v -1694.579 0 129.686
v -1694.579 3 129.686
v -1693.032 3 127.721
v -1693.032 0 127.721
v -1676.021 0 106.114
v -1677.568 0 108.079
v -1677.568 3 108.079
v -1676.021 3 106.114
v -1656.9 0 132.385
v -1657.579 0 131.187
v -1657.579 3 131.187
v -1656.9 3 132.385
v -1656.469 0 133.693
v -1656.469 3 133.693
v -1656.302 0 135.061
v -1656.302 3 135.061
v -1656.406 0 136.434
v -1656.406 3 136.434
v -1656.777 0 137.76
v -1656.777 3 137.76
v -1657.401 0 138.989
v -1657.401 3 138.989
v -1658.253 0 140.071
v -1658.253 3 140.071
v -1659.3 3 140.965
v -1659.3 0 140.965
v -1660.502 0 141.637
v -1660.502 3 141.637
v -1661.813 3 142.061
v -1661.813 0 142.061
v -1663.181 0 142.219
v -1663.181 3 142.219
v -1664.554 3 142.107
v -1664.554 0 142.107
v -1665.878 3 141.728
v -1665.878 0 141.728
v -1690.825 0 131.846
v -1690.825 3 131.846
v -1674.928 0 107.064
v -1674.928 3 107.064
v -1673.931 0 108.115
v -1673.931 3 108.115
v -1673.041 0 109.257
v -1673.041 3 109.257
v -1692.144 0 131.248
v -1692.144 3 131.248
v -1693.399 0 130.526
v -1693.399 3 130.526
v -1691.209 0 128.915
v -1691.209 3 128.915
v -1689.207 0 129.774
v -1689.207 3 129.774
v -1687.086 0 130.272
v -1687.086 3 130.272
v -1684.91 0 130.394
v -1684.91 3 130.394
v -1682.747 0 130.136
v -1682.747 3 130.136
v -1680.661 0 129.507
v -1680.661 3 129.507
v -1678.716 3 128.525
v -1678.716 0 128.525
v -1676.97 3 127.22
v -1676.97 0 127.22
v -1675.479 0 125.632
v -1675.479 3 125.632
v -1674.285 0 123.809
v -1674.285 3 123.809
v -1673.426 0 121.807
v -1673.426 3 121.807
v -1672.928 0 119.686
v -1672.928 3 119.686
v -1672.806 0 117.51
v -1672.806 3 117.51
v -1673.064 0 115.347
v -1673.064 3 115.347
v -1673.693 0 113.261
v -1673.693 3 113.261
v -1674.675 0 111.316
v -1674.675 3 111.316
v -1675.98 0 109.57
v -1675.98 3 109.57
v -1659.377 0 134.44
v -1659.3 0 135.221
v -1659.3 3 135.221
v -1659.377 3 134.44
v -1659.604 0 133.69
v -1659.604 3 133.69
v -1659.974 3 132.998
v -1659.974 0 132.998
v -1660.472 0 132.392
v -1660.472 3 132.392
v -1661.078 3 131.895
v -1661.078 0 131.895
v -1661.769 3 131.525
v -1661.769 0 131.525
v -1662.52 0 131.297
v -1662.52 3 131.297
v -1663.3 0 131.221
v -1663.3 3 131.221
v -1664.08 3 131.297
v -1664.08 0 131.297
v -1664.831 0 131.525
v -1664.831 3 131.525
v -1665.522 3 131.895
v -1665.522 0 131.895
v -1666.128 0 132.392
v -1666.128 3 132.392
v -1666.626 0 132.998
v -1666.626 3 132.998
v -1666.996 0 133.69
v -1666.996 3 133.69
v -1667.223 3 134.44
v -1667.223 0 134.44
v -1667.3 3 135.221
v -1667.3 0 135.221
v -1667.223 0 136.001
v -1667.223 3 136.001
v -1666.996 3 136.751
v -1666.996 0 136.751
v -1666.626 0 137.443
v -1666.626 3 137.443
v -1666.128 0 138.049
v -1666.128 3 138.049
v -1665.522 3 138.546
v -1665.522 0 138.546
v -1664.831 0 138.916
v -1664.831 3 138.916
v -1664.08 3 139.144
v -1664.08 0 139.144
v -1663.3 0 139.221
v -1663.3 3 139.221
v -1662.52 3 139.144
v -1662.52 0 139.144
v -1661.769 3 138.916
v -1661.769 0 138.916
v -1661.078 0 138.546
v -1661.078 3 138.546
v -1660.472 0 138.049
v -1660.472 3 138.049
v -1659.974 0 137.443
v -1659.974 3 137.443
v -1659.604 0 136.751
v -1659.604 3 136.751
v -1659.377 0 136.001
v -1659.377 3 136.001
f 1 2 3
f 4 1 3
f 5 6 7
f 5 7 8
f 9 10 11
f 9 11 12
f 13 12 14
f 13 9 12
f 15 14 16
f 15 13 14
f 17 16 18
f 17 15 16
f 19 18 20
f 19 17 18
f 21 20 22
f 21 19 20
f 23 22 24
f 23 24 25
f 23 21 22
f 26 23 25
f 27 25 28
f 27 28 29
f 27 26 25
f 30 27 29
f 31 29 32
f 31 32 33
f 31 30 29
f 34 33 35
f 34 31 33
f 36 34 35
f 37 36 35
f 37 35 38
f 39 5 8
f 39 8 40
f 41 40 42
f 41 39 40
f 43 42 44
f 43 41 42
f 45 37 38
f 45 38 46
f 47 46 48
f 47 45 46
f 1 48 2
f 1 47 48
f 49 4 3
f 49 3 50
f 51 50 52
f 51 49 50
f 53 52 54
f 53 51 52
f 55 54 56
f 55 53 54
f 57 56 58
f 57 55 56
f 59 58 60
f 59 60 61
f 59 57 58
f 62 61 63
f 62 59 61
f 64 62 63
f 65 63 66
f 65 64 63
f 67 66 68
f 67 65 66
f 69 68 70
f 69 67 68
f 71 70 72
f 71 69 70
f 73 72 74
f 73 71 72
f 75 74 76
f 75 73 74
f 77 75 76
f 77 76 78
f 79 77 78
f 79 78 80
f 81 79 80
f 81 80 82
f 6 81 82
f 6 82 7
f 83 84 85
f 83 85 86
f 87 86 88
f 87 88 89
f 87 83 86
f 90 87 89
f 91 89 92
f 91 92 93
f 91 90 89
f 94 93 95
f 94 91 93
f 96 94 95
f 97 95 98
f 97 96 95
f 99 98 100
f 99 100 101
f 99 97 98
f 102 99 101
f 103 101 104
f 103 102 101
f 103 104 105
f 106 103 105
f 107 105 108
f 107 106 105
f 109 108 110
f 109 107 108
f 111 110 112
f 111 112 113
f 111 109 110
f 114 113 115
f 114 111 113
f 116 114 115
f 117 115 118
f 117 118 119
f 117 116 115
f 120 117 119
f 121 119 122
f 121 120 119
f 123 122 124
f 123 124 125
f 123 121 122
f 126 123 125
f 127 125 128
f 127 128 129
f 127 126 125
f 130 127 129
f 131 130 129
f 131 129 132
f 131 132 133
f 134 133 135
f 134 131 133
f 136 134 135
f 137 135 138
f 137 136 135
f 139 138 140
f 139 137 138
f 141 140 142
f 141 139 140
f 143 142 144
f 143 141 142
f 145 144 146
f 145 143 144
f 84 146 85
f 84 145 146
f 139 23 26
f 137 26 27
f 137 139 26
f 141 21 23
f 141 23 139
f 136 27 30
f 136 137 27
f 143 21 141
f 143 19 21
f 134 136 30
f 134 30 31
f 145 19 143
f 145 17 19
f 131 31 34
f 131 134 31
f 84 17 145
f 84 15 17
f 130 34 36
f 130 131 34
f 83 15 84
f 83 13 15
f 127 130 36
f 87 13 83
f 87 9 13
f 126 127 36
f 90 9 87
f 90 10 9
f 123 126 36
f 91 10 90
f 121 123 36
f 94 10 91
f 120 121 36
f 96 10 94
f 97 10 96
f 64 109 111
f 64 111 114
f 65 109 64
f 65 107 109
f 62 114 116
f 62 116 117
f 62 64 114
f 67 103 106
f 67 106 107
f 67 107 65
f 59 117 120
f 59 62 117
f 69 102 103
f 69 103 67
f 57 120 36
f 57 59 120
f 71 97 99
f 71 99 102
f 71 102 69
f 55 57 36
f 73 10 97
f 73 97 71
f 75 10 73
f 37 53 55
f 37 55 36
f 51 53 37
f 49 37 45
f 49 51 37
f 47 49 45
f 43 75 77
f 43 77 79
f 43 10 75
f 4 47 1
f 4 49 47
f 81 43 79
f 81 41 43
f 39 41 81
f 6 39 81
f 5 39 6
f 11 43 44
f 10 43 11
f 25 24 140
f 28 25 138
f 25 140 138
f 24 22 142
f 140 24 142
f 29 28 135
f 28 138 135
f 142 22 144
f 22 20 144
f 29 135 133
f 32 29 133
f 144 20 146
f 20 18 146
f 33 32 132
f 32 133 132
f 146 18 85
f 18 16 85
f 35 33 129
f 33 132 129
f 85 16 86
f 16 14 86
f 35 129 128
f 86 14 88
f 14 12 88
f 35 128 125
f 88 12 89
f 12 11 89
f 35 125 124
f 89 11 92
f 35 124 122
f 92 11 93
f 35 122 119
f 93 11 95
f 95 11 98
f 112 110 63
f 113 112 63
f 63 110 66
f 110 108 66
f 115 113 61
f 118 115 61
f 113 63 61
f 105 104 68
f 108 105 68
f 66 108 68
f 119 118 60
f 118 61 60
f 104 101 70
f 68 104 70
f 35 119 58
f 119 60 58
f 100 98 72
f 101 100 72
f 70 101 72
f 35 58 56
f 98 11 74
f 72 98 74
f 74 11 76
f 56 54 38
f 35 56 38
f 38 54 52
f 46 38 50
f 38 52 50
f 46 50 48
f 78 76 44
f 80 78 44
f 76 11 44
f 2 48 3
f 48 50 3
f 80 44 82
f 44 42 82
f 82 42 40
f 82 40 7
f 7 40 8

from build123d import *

# Parameters (mm, degrees)
SZKIC1_R                    = 4
DODANIE_WYCI_GNI_CIE1_DEPTH = 3


with BuildPart() as part:
    # Szkic1 → Dodanie-wyciągnięcie1 (new body)
    with BuildSketch(Plane(origin=(0, 0, 0), x_dir=(1, 0, 0), z_dir=(0, 1, 0))):
        with BuildLine():
            Line((-1665.878196442, -141.728418885), (-1690.824706662, -131.845523163))
            ThreePointArc((-1690.824706662, -131.845523163), (-1692.780138286, -130.901827995), (-1694.578843612, -129.685714286))
            Line((-1694.578843612, -129.685714286), (-1693.032369677, -127.721428571))
            ThreePointArc((-1693.032369677, -127.721428571), (-1675.478571429, -125.632369677), (-1677.567630323, -108.078571429))
            Line((-1677.567630323, -108.078571429), (-1676.021156388, -106.114285714))
            ThreePointArc((-1676.021156388, -106.114285714), (-1674.416864421, -107.577337555), (-1673.04059946, -109.256673186))
            Line((-1673.04059946, -109.256673186), (-1657.578946415, -131.186955563))
            ThreePointArc((-1657.578946415, -131.186955563), (-1657.8, -139.550635095), (-1665.878196442, -141.728418885))
        make_face()
        with Locations((-1663.3, -135.220508076)):
            Circle(SZKIC1_R, mode=Mode.SUBTRACT)
    extrude(amount=DODANIE_WYCI_GNI_CIE1_DEPTH)


solid = part.part
